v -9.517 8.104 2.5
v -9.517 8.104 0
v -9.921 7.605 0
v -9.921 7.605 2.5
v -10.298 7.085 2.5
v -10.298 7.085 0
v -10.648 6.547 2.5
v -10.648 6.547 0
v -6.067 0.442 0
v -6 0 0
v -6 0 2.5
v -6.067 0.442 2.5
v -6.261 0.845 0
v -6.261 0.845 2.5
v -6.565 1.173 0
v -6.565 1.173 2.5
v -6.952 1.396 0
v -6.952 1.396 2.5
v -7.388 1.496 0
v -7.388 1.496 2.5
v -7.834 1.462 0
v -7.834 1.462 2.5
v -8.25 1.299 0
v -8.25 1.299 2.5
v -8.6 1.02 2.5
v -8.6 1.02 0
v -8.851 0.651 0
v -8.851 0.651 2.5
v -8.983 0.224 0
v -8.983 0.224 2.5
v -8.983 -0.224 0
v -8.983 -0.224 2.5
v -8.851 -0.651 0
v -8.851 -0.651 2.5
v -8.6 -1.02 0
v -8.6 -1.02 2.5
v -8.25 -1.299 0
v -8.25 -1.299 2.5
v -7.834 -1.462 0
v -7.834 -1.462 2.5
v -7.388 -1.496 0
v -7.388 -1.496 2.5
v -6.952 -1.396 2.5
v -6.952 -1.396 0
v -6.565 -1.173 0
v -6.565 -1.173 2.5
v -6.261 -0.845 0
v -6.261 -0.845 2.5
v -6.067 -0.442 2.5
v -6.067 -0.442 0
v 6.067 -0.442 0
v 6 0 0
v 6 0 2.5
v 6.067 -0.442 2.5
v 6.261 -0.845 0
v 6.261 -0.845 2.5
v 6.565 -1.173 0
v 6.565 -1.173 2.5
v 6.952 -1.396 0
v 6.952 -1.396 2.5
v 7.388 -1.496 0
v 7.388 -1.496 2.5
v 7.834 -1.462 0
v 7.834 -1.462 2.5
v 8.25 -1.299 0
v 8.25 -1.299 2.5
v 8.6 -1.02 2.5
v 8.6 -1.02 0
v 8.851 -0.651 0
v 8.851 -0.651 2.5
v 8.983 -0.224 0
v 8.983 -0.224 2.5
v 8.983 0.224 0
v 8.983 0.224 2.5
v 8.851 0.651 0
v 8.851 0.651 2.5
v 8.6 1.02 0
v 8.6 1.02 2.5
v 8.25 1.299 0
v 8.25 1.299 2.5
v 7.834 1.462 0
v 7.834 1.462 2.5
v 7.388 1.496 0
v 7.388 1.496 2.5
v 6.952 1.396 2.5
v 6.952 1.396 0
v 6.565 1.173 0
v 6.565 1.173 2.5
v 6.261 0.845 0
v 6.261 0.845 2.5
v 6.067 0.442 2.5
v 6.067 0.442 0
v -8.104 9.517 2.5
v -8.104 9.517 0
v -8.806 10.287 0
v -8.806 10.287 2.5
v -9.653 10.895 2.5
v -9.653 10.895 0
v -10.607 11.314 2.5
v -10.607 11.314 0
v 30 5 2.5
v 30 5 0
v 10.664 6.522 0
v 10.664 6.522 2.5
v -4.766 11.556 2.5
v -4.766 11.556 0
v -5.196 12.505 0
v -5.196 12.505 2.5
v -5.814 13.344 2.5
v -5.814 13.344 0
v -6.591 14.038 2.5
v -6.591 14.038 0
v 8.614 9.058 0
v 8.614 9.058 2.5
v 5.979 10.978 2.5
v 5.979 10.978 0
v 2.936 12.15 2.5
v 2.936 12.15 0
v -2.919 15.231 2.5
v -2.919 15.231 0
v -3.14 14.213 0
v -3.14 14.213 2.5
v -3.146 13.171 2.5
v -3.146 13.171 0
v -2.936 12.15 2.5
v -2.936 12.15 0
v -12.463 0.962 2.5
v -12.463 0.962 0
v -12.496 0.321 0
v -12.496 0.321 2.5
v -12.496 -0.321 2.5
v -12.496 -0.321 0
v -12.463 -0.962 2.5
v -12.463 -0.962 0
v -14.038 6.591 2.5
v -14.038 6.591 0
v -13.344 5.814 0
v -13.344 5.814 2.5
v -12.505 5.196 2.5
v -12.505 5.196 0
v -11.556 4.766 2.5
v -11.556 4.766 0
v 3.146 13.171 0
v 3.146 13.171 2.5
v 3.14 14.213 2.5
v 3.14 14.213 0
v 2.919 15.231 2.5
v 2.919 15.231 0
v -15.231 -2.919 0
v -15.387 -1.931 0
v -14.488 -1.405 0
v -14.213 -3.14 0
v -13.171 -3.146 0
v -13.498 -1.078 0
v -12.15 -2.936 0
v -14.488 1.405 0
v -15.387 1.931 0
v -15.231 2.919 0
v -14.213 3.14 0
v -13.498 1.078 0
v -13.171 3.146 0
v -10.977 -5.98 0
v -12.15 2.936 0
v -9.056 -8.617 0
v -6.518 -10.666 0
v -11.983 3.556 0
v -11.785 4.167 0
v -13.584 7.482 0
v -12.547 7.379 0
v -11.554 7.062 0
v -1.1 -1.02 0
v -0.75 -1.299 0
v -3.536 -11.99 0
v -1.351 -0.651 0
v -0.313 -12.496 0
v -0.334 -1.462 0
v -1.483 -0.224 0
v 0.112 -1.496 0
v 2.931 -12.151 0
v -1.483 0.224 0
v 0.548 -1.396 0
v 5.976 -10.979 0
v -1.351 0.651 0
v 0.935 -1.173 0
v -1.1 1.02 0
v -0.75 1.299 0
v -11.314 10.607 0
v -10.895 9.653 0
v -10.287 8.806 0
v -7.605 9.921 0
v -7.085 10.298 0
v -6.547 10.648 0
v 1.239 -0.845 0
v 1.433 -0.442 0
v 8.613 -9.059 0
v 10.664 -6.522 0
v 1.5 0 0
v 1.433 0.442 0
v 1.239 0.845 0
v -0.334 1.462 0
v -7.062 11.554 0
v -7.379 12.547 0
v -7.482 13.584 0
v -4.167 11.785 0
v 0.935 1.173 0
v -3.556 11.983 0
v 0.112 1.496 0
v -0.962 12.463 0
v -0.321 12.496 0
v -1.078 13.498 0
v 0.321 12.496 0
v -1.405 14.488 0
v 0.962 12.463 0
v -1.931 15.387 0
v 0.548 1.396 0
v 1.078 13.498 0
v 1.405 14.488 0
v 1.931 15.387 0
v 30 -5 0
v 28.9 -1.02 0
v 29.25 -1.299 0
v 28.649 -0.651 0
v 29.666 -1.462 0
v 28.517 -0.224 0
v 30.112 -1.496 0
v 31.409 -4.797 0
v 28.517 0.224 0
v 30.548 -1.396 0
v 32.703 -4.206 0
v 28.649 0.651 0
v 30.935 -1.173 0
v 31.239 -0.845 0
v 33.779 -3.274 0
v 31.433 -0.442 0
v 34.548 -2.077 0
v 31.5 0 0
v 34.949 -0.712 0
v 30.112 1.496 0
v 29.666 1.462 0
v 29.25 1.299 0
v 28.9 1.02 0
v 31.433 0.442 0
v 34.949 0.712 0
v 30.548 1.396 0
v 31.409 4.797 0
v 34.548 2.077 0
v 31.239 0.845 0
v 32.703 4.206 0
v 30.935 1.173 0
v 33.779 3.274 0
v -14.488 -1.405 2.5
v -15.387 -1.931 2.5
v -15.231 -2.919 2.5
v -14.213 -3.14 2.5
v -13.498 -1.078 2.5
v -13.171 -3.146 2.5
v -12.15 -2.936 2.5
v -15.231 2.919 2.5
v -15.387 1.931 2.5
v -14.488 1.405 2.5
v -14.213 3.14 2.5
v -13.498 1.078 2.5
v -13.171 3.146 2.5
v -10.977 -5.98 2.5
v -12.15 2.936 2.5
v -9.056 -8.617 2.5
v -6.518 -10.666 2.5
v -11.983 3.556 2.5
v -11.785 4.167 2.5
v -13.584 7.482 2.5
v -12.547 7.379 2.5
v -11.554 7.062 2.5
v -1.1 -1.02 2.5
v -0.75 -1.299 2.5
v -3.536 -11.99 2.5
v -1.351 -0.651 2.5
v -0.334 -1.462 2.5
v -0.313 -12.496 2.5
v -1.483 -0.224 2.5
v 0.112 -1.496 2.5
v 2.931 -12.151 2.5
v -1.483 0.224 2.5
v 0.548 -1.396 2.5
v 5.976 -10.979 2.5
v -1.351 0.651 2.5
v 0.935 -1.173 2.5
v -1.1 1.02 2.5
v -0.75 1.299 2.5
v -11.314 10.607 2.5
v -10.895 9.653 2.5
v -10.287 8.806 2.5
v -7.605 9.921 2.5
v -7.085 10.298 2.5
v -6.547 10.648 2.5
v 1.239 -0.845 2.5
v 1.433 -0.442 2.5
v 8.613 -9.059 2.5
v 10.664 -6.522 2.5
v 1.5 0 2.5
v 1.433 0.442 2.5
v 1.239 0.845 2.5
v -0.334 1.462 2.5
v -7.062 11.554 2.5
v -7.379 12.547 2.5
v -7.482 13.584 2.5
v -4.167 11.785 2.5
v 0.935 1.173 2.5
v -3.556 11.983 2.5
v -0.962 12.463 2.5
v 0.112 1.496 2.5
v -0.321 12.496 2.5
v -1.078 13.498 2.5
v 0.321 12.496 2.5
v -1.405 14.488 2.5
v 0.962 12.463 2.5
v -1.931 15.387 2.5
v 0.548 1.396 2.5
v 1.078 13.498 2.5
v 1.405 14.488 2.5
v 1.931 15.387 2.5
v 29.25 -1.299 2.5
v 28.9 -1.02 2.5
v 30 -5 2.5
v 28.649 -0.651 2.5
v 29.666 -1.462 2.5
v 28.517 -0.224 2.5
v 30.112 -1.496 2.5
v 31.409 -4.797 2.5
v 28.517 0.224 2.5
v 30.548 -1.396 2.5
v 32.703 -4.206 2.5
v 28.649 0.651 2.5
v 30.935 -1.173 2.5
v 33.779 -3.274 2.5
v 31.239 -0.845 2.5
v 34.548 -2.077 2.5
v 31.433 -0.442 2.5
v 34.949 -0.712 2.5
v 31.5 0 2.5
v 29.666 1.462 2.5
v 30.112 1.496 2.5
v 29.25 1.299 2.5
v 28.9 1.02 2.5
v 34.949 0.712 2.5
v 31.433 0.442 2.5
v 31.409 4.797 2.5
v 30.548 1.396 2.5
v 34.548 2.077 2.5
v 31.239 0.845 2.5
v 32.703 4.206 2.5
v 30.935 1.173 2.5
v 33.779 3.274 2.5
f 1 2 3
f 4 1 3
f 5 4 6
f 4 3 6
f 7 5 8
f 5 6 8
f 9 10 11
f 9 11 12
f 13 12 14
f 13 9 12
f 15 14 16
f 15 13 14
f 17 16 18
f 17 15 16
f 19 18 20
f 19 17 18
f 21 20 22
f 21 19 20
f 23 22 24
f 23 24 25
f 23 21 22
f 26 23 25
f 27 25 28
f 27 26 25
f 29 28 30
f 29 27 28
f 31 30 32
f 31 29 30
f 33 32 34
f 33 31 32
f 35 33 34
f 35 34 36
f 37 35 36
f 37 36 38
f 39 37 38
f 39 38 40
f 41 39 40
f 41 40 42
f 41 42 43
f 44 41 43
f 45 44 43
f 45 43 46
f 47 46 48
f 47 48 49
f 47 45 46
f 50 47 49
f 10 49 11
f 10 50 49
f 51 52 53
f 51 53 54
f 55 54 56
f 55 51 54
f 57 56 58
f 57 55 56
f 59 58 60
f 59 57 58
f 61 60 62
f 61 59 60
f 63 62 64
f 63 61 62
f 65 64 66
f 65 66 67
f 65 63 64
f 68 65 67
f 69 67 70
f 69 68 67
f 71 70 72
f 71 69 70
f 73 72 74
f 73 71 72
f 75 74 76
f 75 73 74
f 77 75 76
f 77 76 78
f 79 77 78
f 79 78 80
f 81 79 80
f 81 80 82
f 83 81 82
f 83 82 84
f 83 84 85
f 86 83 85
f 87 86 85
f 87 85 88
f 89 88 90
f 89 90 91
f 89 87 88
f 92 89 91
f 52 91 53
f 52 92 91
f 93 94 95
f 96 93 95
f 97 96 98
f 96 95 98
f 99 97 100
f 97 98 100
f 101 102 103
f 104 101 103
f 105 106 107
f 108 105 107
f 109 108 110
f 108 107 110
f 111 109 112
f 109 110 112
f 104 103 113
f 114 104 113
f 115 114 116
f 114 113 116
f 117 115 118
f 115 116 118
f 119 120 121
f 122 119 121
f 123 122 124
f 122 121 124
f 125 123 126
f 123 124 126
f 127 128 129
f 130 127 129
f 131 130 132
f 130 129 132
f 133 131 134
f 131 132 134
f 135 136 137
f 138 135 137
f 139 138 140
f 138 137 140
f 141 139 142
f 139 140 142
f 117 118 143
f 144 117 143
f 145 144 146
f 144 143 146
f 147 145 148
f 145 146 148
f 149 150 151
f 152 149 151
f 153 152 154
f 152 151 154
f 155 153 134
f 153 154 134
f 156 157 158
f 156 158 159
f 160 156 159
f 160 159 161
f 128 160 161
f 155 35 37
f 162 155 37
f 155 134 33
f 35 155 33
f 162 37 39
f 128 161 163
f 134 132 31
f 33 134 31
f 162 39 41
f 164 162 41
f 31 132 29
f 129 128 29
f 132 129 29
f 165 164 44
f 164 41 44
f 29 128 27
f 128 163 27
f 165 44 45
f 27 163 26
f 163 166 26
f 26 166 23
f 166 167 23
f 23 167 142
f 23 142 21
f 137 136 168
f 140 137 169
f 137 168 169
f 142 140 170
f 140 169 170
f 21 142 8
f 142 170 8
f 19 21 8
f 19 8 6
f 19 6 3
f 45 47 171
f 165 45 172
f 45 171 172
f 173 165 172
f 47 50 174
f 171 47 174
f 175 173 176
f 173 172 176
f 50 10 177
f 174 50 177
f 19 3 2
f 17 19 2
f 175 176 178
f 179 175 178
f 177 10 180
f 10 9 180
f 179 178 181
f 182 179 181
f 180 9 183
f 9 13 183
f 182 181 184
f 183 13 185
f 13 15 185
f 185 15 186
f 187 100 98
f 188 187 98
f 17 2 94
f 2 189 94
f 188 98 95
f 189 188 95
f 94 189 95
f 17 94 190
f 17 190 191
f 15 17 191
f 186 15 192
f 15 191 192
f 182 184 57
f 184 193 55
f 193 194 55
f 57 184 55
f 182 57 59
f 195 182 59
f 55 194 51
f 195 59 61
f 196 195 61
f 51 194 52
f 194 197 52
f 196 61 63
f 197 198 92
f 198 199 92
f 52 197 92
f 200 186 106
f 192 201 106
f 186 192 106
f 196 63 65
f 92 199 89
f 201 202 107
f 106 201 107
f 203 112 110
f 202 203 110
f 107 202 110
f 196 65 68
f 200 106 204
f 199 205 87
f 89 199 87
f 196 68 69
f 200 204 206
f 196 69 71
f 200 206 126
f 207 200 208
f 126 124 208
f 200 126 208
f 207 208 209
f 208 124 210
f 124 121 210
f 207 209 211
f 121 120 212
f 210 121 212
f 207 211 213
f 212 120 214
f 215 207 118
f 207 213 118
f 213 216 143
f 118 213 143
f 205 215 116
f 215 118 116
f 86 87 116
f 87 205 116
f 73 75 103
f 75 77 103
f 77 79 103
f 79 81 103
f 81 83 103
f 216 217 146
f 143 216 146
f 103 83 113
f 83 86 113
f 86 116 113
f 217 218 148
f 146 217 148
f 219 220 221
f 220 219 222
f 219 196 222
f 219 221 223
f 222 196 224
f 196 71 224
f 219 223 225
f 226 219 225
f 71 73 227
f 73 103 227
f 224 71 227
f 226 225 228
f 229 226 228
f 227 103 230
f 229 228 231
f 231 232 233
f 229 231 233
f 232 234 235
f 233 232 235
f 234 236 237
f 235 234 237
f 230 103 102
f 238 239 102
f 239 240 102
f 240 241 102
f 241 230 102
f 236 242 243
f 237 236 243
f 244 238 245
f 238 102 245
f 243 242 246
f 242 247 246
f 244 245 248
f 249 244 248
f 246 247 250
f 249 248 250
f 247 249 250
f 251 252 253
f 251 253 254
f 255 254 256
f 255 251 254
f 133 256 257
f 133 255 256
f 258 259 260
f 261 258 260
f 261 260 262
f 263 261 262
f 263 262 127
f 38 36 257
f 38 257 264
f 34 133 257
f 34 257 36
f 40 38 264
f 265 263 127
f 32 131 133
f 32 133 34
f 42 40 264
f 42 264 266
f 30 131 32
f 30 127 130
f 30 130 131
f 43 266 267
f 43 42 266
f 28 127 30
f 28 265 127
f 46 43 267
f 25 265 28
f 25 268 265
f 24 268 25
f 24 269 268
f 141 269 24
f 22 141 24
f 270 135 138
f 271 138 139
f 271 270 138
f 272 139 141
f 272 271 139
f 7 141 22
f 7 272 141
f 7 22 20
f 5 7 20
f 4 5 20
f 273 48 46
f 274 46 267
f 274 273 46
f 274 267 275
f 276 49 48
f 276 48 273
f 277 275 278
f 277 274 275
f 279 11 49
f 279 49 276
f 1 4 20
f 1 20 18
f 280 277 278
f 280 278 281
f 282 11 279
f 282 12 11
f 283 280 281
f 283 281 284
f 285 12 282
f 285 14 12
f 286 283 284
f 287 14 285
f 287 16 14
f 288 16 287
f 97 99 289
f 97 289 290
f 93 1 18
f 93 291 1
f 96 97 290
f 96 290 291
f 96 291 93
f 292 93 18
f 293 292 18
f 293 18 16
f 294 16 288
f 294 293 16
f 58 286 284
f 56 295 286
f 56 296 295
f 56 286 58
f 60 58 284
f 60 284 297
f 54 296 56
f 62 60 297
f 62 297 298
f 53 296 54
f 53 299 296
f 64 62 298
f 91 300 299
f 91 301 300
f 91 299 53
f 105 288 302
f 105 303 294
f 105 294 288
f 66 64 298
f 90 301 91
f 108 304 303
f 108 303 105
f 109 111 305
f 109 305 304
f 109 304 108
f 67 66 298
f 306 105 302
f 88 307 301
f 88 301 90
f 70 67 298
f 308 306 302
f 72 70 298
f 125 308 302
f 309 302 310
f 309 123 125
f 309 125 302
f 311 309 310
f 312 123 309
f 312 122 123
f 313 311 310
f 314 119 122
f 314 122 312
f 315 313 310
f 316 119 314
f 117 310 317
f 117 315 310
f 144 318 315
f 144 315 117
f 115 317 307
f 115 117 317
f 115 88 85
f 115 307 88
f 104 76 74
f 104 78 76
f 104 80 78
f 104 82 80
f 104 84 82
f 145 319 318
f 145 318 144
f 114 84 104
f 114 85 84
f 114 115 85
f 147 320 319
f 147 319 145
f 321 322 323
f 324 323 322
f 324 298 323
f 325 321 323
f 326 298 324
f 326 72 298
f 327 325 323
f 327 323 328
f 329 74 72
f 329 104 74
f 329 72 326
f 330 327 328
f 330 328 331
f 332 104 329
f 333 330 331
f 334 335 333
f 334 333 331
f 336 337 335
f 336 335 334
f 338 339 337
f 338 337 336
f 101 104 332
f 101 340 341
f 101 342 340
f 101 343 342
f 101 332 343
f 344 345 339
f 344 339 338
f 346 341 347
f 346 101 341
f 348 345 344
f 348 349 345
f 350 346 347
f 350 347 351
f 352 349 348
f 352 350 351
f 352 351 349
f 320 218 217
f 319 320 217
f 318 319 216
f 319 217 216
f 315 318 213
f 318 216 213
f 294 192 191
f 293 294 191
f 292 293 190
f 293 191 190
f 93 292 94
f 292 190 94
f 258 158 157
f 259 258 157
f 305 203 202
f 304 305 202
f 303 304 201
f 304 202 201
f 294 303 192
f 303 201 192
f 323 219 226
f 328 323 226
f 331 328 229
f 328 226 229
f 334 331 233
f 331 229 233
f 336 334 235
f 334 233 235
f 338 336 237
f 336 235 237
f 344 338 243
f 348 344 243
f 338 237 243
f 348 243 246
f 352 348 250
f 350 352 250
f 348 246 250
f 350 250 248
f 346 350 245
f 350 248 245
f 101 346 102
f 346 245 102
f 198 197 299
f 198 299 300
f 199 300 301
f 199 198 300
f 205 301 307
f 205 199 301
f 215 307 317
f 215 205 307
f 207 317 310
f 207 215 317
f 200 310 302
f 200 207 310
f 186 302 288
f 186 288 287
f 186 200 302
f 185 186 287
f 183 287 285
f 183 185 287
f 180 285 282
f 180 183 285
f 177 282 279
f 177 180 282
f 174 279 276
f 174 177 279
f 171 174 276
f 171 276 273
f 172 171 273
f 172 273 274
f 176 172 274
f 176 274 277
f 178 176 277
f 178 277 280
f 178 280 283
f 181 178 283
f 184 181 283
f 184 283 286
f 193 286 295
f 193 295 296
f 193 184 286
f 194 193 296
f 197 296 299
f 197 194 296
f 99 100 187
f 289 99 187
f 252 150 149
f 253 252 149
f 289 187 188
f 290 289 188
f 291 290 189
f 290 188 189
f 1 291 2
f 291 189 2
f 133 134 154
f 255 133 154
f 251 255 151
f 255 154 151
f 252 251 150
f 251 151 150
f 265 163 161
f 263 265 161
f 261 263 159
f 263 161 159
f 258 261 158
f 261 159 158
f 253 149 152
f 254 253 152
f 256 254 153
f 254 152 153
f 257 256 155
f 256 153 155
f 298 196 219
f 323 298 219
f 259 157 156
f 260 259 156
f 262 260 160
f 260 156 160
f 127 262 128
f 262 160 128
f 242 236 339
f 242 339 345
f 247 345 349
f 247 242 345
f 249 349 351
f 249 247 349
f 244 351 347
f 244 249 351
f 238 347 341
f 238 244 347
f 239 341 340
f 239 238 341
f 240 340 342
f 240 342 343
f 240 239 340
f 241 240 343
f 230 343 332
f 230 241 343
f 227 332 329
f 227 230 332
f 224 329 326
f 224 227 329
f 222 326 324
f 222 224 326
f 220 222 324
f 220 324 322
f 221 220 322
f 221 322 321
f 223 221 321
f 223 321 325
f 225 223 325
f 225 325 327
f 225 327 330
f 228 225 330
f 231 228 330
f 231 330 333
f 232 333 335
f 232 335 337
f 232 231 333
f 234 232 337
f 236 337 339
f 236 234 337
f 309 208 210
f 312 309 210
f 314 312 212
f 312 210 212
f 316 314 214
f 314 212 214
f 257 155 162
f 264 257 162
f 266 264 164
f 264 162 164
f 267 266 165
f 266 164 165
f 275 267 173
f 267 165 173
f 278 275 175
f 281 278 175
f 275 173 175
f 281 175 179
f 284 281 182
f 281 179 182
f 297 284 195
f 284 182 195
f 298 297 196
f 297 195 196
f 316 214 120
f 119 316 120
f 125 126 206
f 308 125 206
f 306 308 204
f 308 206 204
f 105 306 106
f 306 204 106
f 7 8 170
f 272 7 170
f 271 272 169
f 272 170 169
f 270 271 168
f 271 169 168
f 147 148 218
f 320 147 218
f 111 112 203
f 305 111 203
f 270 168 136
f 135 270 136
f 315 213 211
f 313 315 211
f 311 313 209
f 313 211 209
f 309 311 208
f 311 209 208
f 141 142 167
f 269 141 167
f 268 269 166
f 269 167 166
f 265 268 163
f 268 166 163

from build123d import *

# Parameters (mm, degrees)
SKETCH1_R           = 1.5
BOSS_EXTRUDE1_DEPTH = 2.5


with BuildPart() as part:
    # Sketch1 → Boss-Extrude1 (new body)
    with BuildSketch(Plane.XY):
        with BuildLine():
            Line((30, 5), (10.663780267, 6.521793497))
            ThreePointArc((10.663780267, 6.521793497), (7.359278279, 10.104010254), (2.936071308, 12.150287456))
            ThreePointArc((2.936071308, 12.150287456), (3.170504769, 13.6920006), (2.918578378, 15.230952047))
            Line((2.918578378, 15.230952047), (1.930890038, 15.387386512))
            ThreePointArc((1.930890038, 15.387386512), (1.215731652, 14.001606246), (0.962275561, 12.462905991))
            ThreePointArc((0.962275561, 12.462905991), (0, 12.5), (-0.962275561, 12.462905991))
            ThreePointArc((-0.962275561, 12.462905991), (-1.215731652, 14.001606246), (-1.930890038, 15.387386512))
            Line((-1.930890038, 15.387386512), (-2.918578378, 15.230952047))
            ThreePointArc((-2.918578378, 15.230952047), (-3.170504769, 13.6920006), (-2.936071308, 12.150287456))
            ThreePointArc((-2.936071308, 12.150287456), (-3.86271243, 11.888206454), (-4.766428193, 11.555568453))
            ThreePointArc((-4.766428193, 11.555568453), (-5.482963788, 12.940637118), (-6.591349484, 14.037596375))
            Line((-6.591349484, 14.037596375), (-7.482356008, 13.583605875))
            ThreePointArc((-7.482356008, 13.583605875), (-7.246390093, 12.042126537), (-6.54701506, 10.648314129))
            ThreePointArc((-6.54701506, 10.648314129), (-7.347315654, 10.11271243), (-8.104009624, 9.517091363))
            ThreePointArc((-8.104009624, 9.517091363), (-9.213485226, 10.612948266), (-10.606601718, 11.313708499))
            Line((-10.606601718, 11.313708499), (-11.313708499, 10.606601718))
            ThreePointArc((-11.313708499, 10.606601718), (-10.612948266, 9.213485226), (-9.517091363, 8.104009624))
            ThreePointArc((-9.517091363, 8.104009624), (-10.11271243, 7.347315654), (-10.648314129, 6.54701506))
            ThreePointArc((-10.648314129, 6.54701506), (-12.042126537, 7.246390093), (-13.583605875, 7.482356008))
            Line((-13.583605875, 7.482356008), (-14.037596375, 6.591349484))
            ThreePointArc((-14.037596375, 6.591349484), (-12.940637118, 5.482963788), (-11.555568453, 4.766428193))
            ThreePointArc((-11.555568453, 4.766428193), (-11.888206454, 3.86271243), (-12.150287456, 2.936071308))
            ThreePointArc((-12.150287456, 2.936071308), (-13.6920006, 3.170504769), (-15.230952047, 2.918578378))
            Line((-15.230952047, 2.918578378), (-15.387386512, 1.930890038))
            ThreePointArc((-15.387386512, 1.930890038), (-14.001606246, 1.215731652), (-12.462905991, 0.962275561))
            ThreePointArc((-12.462905991, 0.962275561), (-12.5, 0), (-12.462905991, -0.962275561))
            ThreePointArc((-12.462905991, -0.962275561), (-14.001606246, -1.215731652), (-15.387386512, -1.930890038))
            Line((-15.387386512, -1.930890038), (-15.230952047, -2.918578378))
            ThreePointArc((-15.230952047, -2.918578378), (-13.6920006, -3.170504769), (-12.150287456, -2.936071308))
            ThreePointArc((-12.150287456, -2.936071308), (-1.940818593, -12.348409743), (10.663780267, -6.521793497))
            Line((10.663780267, -6.521793497), (30, -5))
            ThreePointArc((30, -5), (35, 0), (30, 5))
        make_face()
        with Locations((30, 0)):
            Circle(SKETCH1_R, mode=Mode.SUBTRACT)
        Circle(SKETCH1_R, mode=Mode.SUBTRACT)
        with Locations((-7.5, 0)):
            Circle(SKETCH1_R, mode=Mode.SUBTRACT)
        with Locations(Location((7.5, 0, 0), (0, 0, 180))):
            Circle(SKETCH1_R, mode=Mode.SUBTRACT)
    extrude(amount=BOSS_EXTRUDE1_DEPTH)


solid = part.part
